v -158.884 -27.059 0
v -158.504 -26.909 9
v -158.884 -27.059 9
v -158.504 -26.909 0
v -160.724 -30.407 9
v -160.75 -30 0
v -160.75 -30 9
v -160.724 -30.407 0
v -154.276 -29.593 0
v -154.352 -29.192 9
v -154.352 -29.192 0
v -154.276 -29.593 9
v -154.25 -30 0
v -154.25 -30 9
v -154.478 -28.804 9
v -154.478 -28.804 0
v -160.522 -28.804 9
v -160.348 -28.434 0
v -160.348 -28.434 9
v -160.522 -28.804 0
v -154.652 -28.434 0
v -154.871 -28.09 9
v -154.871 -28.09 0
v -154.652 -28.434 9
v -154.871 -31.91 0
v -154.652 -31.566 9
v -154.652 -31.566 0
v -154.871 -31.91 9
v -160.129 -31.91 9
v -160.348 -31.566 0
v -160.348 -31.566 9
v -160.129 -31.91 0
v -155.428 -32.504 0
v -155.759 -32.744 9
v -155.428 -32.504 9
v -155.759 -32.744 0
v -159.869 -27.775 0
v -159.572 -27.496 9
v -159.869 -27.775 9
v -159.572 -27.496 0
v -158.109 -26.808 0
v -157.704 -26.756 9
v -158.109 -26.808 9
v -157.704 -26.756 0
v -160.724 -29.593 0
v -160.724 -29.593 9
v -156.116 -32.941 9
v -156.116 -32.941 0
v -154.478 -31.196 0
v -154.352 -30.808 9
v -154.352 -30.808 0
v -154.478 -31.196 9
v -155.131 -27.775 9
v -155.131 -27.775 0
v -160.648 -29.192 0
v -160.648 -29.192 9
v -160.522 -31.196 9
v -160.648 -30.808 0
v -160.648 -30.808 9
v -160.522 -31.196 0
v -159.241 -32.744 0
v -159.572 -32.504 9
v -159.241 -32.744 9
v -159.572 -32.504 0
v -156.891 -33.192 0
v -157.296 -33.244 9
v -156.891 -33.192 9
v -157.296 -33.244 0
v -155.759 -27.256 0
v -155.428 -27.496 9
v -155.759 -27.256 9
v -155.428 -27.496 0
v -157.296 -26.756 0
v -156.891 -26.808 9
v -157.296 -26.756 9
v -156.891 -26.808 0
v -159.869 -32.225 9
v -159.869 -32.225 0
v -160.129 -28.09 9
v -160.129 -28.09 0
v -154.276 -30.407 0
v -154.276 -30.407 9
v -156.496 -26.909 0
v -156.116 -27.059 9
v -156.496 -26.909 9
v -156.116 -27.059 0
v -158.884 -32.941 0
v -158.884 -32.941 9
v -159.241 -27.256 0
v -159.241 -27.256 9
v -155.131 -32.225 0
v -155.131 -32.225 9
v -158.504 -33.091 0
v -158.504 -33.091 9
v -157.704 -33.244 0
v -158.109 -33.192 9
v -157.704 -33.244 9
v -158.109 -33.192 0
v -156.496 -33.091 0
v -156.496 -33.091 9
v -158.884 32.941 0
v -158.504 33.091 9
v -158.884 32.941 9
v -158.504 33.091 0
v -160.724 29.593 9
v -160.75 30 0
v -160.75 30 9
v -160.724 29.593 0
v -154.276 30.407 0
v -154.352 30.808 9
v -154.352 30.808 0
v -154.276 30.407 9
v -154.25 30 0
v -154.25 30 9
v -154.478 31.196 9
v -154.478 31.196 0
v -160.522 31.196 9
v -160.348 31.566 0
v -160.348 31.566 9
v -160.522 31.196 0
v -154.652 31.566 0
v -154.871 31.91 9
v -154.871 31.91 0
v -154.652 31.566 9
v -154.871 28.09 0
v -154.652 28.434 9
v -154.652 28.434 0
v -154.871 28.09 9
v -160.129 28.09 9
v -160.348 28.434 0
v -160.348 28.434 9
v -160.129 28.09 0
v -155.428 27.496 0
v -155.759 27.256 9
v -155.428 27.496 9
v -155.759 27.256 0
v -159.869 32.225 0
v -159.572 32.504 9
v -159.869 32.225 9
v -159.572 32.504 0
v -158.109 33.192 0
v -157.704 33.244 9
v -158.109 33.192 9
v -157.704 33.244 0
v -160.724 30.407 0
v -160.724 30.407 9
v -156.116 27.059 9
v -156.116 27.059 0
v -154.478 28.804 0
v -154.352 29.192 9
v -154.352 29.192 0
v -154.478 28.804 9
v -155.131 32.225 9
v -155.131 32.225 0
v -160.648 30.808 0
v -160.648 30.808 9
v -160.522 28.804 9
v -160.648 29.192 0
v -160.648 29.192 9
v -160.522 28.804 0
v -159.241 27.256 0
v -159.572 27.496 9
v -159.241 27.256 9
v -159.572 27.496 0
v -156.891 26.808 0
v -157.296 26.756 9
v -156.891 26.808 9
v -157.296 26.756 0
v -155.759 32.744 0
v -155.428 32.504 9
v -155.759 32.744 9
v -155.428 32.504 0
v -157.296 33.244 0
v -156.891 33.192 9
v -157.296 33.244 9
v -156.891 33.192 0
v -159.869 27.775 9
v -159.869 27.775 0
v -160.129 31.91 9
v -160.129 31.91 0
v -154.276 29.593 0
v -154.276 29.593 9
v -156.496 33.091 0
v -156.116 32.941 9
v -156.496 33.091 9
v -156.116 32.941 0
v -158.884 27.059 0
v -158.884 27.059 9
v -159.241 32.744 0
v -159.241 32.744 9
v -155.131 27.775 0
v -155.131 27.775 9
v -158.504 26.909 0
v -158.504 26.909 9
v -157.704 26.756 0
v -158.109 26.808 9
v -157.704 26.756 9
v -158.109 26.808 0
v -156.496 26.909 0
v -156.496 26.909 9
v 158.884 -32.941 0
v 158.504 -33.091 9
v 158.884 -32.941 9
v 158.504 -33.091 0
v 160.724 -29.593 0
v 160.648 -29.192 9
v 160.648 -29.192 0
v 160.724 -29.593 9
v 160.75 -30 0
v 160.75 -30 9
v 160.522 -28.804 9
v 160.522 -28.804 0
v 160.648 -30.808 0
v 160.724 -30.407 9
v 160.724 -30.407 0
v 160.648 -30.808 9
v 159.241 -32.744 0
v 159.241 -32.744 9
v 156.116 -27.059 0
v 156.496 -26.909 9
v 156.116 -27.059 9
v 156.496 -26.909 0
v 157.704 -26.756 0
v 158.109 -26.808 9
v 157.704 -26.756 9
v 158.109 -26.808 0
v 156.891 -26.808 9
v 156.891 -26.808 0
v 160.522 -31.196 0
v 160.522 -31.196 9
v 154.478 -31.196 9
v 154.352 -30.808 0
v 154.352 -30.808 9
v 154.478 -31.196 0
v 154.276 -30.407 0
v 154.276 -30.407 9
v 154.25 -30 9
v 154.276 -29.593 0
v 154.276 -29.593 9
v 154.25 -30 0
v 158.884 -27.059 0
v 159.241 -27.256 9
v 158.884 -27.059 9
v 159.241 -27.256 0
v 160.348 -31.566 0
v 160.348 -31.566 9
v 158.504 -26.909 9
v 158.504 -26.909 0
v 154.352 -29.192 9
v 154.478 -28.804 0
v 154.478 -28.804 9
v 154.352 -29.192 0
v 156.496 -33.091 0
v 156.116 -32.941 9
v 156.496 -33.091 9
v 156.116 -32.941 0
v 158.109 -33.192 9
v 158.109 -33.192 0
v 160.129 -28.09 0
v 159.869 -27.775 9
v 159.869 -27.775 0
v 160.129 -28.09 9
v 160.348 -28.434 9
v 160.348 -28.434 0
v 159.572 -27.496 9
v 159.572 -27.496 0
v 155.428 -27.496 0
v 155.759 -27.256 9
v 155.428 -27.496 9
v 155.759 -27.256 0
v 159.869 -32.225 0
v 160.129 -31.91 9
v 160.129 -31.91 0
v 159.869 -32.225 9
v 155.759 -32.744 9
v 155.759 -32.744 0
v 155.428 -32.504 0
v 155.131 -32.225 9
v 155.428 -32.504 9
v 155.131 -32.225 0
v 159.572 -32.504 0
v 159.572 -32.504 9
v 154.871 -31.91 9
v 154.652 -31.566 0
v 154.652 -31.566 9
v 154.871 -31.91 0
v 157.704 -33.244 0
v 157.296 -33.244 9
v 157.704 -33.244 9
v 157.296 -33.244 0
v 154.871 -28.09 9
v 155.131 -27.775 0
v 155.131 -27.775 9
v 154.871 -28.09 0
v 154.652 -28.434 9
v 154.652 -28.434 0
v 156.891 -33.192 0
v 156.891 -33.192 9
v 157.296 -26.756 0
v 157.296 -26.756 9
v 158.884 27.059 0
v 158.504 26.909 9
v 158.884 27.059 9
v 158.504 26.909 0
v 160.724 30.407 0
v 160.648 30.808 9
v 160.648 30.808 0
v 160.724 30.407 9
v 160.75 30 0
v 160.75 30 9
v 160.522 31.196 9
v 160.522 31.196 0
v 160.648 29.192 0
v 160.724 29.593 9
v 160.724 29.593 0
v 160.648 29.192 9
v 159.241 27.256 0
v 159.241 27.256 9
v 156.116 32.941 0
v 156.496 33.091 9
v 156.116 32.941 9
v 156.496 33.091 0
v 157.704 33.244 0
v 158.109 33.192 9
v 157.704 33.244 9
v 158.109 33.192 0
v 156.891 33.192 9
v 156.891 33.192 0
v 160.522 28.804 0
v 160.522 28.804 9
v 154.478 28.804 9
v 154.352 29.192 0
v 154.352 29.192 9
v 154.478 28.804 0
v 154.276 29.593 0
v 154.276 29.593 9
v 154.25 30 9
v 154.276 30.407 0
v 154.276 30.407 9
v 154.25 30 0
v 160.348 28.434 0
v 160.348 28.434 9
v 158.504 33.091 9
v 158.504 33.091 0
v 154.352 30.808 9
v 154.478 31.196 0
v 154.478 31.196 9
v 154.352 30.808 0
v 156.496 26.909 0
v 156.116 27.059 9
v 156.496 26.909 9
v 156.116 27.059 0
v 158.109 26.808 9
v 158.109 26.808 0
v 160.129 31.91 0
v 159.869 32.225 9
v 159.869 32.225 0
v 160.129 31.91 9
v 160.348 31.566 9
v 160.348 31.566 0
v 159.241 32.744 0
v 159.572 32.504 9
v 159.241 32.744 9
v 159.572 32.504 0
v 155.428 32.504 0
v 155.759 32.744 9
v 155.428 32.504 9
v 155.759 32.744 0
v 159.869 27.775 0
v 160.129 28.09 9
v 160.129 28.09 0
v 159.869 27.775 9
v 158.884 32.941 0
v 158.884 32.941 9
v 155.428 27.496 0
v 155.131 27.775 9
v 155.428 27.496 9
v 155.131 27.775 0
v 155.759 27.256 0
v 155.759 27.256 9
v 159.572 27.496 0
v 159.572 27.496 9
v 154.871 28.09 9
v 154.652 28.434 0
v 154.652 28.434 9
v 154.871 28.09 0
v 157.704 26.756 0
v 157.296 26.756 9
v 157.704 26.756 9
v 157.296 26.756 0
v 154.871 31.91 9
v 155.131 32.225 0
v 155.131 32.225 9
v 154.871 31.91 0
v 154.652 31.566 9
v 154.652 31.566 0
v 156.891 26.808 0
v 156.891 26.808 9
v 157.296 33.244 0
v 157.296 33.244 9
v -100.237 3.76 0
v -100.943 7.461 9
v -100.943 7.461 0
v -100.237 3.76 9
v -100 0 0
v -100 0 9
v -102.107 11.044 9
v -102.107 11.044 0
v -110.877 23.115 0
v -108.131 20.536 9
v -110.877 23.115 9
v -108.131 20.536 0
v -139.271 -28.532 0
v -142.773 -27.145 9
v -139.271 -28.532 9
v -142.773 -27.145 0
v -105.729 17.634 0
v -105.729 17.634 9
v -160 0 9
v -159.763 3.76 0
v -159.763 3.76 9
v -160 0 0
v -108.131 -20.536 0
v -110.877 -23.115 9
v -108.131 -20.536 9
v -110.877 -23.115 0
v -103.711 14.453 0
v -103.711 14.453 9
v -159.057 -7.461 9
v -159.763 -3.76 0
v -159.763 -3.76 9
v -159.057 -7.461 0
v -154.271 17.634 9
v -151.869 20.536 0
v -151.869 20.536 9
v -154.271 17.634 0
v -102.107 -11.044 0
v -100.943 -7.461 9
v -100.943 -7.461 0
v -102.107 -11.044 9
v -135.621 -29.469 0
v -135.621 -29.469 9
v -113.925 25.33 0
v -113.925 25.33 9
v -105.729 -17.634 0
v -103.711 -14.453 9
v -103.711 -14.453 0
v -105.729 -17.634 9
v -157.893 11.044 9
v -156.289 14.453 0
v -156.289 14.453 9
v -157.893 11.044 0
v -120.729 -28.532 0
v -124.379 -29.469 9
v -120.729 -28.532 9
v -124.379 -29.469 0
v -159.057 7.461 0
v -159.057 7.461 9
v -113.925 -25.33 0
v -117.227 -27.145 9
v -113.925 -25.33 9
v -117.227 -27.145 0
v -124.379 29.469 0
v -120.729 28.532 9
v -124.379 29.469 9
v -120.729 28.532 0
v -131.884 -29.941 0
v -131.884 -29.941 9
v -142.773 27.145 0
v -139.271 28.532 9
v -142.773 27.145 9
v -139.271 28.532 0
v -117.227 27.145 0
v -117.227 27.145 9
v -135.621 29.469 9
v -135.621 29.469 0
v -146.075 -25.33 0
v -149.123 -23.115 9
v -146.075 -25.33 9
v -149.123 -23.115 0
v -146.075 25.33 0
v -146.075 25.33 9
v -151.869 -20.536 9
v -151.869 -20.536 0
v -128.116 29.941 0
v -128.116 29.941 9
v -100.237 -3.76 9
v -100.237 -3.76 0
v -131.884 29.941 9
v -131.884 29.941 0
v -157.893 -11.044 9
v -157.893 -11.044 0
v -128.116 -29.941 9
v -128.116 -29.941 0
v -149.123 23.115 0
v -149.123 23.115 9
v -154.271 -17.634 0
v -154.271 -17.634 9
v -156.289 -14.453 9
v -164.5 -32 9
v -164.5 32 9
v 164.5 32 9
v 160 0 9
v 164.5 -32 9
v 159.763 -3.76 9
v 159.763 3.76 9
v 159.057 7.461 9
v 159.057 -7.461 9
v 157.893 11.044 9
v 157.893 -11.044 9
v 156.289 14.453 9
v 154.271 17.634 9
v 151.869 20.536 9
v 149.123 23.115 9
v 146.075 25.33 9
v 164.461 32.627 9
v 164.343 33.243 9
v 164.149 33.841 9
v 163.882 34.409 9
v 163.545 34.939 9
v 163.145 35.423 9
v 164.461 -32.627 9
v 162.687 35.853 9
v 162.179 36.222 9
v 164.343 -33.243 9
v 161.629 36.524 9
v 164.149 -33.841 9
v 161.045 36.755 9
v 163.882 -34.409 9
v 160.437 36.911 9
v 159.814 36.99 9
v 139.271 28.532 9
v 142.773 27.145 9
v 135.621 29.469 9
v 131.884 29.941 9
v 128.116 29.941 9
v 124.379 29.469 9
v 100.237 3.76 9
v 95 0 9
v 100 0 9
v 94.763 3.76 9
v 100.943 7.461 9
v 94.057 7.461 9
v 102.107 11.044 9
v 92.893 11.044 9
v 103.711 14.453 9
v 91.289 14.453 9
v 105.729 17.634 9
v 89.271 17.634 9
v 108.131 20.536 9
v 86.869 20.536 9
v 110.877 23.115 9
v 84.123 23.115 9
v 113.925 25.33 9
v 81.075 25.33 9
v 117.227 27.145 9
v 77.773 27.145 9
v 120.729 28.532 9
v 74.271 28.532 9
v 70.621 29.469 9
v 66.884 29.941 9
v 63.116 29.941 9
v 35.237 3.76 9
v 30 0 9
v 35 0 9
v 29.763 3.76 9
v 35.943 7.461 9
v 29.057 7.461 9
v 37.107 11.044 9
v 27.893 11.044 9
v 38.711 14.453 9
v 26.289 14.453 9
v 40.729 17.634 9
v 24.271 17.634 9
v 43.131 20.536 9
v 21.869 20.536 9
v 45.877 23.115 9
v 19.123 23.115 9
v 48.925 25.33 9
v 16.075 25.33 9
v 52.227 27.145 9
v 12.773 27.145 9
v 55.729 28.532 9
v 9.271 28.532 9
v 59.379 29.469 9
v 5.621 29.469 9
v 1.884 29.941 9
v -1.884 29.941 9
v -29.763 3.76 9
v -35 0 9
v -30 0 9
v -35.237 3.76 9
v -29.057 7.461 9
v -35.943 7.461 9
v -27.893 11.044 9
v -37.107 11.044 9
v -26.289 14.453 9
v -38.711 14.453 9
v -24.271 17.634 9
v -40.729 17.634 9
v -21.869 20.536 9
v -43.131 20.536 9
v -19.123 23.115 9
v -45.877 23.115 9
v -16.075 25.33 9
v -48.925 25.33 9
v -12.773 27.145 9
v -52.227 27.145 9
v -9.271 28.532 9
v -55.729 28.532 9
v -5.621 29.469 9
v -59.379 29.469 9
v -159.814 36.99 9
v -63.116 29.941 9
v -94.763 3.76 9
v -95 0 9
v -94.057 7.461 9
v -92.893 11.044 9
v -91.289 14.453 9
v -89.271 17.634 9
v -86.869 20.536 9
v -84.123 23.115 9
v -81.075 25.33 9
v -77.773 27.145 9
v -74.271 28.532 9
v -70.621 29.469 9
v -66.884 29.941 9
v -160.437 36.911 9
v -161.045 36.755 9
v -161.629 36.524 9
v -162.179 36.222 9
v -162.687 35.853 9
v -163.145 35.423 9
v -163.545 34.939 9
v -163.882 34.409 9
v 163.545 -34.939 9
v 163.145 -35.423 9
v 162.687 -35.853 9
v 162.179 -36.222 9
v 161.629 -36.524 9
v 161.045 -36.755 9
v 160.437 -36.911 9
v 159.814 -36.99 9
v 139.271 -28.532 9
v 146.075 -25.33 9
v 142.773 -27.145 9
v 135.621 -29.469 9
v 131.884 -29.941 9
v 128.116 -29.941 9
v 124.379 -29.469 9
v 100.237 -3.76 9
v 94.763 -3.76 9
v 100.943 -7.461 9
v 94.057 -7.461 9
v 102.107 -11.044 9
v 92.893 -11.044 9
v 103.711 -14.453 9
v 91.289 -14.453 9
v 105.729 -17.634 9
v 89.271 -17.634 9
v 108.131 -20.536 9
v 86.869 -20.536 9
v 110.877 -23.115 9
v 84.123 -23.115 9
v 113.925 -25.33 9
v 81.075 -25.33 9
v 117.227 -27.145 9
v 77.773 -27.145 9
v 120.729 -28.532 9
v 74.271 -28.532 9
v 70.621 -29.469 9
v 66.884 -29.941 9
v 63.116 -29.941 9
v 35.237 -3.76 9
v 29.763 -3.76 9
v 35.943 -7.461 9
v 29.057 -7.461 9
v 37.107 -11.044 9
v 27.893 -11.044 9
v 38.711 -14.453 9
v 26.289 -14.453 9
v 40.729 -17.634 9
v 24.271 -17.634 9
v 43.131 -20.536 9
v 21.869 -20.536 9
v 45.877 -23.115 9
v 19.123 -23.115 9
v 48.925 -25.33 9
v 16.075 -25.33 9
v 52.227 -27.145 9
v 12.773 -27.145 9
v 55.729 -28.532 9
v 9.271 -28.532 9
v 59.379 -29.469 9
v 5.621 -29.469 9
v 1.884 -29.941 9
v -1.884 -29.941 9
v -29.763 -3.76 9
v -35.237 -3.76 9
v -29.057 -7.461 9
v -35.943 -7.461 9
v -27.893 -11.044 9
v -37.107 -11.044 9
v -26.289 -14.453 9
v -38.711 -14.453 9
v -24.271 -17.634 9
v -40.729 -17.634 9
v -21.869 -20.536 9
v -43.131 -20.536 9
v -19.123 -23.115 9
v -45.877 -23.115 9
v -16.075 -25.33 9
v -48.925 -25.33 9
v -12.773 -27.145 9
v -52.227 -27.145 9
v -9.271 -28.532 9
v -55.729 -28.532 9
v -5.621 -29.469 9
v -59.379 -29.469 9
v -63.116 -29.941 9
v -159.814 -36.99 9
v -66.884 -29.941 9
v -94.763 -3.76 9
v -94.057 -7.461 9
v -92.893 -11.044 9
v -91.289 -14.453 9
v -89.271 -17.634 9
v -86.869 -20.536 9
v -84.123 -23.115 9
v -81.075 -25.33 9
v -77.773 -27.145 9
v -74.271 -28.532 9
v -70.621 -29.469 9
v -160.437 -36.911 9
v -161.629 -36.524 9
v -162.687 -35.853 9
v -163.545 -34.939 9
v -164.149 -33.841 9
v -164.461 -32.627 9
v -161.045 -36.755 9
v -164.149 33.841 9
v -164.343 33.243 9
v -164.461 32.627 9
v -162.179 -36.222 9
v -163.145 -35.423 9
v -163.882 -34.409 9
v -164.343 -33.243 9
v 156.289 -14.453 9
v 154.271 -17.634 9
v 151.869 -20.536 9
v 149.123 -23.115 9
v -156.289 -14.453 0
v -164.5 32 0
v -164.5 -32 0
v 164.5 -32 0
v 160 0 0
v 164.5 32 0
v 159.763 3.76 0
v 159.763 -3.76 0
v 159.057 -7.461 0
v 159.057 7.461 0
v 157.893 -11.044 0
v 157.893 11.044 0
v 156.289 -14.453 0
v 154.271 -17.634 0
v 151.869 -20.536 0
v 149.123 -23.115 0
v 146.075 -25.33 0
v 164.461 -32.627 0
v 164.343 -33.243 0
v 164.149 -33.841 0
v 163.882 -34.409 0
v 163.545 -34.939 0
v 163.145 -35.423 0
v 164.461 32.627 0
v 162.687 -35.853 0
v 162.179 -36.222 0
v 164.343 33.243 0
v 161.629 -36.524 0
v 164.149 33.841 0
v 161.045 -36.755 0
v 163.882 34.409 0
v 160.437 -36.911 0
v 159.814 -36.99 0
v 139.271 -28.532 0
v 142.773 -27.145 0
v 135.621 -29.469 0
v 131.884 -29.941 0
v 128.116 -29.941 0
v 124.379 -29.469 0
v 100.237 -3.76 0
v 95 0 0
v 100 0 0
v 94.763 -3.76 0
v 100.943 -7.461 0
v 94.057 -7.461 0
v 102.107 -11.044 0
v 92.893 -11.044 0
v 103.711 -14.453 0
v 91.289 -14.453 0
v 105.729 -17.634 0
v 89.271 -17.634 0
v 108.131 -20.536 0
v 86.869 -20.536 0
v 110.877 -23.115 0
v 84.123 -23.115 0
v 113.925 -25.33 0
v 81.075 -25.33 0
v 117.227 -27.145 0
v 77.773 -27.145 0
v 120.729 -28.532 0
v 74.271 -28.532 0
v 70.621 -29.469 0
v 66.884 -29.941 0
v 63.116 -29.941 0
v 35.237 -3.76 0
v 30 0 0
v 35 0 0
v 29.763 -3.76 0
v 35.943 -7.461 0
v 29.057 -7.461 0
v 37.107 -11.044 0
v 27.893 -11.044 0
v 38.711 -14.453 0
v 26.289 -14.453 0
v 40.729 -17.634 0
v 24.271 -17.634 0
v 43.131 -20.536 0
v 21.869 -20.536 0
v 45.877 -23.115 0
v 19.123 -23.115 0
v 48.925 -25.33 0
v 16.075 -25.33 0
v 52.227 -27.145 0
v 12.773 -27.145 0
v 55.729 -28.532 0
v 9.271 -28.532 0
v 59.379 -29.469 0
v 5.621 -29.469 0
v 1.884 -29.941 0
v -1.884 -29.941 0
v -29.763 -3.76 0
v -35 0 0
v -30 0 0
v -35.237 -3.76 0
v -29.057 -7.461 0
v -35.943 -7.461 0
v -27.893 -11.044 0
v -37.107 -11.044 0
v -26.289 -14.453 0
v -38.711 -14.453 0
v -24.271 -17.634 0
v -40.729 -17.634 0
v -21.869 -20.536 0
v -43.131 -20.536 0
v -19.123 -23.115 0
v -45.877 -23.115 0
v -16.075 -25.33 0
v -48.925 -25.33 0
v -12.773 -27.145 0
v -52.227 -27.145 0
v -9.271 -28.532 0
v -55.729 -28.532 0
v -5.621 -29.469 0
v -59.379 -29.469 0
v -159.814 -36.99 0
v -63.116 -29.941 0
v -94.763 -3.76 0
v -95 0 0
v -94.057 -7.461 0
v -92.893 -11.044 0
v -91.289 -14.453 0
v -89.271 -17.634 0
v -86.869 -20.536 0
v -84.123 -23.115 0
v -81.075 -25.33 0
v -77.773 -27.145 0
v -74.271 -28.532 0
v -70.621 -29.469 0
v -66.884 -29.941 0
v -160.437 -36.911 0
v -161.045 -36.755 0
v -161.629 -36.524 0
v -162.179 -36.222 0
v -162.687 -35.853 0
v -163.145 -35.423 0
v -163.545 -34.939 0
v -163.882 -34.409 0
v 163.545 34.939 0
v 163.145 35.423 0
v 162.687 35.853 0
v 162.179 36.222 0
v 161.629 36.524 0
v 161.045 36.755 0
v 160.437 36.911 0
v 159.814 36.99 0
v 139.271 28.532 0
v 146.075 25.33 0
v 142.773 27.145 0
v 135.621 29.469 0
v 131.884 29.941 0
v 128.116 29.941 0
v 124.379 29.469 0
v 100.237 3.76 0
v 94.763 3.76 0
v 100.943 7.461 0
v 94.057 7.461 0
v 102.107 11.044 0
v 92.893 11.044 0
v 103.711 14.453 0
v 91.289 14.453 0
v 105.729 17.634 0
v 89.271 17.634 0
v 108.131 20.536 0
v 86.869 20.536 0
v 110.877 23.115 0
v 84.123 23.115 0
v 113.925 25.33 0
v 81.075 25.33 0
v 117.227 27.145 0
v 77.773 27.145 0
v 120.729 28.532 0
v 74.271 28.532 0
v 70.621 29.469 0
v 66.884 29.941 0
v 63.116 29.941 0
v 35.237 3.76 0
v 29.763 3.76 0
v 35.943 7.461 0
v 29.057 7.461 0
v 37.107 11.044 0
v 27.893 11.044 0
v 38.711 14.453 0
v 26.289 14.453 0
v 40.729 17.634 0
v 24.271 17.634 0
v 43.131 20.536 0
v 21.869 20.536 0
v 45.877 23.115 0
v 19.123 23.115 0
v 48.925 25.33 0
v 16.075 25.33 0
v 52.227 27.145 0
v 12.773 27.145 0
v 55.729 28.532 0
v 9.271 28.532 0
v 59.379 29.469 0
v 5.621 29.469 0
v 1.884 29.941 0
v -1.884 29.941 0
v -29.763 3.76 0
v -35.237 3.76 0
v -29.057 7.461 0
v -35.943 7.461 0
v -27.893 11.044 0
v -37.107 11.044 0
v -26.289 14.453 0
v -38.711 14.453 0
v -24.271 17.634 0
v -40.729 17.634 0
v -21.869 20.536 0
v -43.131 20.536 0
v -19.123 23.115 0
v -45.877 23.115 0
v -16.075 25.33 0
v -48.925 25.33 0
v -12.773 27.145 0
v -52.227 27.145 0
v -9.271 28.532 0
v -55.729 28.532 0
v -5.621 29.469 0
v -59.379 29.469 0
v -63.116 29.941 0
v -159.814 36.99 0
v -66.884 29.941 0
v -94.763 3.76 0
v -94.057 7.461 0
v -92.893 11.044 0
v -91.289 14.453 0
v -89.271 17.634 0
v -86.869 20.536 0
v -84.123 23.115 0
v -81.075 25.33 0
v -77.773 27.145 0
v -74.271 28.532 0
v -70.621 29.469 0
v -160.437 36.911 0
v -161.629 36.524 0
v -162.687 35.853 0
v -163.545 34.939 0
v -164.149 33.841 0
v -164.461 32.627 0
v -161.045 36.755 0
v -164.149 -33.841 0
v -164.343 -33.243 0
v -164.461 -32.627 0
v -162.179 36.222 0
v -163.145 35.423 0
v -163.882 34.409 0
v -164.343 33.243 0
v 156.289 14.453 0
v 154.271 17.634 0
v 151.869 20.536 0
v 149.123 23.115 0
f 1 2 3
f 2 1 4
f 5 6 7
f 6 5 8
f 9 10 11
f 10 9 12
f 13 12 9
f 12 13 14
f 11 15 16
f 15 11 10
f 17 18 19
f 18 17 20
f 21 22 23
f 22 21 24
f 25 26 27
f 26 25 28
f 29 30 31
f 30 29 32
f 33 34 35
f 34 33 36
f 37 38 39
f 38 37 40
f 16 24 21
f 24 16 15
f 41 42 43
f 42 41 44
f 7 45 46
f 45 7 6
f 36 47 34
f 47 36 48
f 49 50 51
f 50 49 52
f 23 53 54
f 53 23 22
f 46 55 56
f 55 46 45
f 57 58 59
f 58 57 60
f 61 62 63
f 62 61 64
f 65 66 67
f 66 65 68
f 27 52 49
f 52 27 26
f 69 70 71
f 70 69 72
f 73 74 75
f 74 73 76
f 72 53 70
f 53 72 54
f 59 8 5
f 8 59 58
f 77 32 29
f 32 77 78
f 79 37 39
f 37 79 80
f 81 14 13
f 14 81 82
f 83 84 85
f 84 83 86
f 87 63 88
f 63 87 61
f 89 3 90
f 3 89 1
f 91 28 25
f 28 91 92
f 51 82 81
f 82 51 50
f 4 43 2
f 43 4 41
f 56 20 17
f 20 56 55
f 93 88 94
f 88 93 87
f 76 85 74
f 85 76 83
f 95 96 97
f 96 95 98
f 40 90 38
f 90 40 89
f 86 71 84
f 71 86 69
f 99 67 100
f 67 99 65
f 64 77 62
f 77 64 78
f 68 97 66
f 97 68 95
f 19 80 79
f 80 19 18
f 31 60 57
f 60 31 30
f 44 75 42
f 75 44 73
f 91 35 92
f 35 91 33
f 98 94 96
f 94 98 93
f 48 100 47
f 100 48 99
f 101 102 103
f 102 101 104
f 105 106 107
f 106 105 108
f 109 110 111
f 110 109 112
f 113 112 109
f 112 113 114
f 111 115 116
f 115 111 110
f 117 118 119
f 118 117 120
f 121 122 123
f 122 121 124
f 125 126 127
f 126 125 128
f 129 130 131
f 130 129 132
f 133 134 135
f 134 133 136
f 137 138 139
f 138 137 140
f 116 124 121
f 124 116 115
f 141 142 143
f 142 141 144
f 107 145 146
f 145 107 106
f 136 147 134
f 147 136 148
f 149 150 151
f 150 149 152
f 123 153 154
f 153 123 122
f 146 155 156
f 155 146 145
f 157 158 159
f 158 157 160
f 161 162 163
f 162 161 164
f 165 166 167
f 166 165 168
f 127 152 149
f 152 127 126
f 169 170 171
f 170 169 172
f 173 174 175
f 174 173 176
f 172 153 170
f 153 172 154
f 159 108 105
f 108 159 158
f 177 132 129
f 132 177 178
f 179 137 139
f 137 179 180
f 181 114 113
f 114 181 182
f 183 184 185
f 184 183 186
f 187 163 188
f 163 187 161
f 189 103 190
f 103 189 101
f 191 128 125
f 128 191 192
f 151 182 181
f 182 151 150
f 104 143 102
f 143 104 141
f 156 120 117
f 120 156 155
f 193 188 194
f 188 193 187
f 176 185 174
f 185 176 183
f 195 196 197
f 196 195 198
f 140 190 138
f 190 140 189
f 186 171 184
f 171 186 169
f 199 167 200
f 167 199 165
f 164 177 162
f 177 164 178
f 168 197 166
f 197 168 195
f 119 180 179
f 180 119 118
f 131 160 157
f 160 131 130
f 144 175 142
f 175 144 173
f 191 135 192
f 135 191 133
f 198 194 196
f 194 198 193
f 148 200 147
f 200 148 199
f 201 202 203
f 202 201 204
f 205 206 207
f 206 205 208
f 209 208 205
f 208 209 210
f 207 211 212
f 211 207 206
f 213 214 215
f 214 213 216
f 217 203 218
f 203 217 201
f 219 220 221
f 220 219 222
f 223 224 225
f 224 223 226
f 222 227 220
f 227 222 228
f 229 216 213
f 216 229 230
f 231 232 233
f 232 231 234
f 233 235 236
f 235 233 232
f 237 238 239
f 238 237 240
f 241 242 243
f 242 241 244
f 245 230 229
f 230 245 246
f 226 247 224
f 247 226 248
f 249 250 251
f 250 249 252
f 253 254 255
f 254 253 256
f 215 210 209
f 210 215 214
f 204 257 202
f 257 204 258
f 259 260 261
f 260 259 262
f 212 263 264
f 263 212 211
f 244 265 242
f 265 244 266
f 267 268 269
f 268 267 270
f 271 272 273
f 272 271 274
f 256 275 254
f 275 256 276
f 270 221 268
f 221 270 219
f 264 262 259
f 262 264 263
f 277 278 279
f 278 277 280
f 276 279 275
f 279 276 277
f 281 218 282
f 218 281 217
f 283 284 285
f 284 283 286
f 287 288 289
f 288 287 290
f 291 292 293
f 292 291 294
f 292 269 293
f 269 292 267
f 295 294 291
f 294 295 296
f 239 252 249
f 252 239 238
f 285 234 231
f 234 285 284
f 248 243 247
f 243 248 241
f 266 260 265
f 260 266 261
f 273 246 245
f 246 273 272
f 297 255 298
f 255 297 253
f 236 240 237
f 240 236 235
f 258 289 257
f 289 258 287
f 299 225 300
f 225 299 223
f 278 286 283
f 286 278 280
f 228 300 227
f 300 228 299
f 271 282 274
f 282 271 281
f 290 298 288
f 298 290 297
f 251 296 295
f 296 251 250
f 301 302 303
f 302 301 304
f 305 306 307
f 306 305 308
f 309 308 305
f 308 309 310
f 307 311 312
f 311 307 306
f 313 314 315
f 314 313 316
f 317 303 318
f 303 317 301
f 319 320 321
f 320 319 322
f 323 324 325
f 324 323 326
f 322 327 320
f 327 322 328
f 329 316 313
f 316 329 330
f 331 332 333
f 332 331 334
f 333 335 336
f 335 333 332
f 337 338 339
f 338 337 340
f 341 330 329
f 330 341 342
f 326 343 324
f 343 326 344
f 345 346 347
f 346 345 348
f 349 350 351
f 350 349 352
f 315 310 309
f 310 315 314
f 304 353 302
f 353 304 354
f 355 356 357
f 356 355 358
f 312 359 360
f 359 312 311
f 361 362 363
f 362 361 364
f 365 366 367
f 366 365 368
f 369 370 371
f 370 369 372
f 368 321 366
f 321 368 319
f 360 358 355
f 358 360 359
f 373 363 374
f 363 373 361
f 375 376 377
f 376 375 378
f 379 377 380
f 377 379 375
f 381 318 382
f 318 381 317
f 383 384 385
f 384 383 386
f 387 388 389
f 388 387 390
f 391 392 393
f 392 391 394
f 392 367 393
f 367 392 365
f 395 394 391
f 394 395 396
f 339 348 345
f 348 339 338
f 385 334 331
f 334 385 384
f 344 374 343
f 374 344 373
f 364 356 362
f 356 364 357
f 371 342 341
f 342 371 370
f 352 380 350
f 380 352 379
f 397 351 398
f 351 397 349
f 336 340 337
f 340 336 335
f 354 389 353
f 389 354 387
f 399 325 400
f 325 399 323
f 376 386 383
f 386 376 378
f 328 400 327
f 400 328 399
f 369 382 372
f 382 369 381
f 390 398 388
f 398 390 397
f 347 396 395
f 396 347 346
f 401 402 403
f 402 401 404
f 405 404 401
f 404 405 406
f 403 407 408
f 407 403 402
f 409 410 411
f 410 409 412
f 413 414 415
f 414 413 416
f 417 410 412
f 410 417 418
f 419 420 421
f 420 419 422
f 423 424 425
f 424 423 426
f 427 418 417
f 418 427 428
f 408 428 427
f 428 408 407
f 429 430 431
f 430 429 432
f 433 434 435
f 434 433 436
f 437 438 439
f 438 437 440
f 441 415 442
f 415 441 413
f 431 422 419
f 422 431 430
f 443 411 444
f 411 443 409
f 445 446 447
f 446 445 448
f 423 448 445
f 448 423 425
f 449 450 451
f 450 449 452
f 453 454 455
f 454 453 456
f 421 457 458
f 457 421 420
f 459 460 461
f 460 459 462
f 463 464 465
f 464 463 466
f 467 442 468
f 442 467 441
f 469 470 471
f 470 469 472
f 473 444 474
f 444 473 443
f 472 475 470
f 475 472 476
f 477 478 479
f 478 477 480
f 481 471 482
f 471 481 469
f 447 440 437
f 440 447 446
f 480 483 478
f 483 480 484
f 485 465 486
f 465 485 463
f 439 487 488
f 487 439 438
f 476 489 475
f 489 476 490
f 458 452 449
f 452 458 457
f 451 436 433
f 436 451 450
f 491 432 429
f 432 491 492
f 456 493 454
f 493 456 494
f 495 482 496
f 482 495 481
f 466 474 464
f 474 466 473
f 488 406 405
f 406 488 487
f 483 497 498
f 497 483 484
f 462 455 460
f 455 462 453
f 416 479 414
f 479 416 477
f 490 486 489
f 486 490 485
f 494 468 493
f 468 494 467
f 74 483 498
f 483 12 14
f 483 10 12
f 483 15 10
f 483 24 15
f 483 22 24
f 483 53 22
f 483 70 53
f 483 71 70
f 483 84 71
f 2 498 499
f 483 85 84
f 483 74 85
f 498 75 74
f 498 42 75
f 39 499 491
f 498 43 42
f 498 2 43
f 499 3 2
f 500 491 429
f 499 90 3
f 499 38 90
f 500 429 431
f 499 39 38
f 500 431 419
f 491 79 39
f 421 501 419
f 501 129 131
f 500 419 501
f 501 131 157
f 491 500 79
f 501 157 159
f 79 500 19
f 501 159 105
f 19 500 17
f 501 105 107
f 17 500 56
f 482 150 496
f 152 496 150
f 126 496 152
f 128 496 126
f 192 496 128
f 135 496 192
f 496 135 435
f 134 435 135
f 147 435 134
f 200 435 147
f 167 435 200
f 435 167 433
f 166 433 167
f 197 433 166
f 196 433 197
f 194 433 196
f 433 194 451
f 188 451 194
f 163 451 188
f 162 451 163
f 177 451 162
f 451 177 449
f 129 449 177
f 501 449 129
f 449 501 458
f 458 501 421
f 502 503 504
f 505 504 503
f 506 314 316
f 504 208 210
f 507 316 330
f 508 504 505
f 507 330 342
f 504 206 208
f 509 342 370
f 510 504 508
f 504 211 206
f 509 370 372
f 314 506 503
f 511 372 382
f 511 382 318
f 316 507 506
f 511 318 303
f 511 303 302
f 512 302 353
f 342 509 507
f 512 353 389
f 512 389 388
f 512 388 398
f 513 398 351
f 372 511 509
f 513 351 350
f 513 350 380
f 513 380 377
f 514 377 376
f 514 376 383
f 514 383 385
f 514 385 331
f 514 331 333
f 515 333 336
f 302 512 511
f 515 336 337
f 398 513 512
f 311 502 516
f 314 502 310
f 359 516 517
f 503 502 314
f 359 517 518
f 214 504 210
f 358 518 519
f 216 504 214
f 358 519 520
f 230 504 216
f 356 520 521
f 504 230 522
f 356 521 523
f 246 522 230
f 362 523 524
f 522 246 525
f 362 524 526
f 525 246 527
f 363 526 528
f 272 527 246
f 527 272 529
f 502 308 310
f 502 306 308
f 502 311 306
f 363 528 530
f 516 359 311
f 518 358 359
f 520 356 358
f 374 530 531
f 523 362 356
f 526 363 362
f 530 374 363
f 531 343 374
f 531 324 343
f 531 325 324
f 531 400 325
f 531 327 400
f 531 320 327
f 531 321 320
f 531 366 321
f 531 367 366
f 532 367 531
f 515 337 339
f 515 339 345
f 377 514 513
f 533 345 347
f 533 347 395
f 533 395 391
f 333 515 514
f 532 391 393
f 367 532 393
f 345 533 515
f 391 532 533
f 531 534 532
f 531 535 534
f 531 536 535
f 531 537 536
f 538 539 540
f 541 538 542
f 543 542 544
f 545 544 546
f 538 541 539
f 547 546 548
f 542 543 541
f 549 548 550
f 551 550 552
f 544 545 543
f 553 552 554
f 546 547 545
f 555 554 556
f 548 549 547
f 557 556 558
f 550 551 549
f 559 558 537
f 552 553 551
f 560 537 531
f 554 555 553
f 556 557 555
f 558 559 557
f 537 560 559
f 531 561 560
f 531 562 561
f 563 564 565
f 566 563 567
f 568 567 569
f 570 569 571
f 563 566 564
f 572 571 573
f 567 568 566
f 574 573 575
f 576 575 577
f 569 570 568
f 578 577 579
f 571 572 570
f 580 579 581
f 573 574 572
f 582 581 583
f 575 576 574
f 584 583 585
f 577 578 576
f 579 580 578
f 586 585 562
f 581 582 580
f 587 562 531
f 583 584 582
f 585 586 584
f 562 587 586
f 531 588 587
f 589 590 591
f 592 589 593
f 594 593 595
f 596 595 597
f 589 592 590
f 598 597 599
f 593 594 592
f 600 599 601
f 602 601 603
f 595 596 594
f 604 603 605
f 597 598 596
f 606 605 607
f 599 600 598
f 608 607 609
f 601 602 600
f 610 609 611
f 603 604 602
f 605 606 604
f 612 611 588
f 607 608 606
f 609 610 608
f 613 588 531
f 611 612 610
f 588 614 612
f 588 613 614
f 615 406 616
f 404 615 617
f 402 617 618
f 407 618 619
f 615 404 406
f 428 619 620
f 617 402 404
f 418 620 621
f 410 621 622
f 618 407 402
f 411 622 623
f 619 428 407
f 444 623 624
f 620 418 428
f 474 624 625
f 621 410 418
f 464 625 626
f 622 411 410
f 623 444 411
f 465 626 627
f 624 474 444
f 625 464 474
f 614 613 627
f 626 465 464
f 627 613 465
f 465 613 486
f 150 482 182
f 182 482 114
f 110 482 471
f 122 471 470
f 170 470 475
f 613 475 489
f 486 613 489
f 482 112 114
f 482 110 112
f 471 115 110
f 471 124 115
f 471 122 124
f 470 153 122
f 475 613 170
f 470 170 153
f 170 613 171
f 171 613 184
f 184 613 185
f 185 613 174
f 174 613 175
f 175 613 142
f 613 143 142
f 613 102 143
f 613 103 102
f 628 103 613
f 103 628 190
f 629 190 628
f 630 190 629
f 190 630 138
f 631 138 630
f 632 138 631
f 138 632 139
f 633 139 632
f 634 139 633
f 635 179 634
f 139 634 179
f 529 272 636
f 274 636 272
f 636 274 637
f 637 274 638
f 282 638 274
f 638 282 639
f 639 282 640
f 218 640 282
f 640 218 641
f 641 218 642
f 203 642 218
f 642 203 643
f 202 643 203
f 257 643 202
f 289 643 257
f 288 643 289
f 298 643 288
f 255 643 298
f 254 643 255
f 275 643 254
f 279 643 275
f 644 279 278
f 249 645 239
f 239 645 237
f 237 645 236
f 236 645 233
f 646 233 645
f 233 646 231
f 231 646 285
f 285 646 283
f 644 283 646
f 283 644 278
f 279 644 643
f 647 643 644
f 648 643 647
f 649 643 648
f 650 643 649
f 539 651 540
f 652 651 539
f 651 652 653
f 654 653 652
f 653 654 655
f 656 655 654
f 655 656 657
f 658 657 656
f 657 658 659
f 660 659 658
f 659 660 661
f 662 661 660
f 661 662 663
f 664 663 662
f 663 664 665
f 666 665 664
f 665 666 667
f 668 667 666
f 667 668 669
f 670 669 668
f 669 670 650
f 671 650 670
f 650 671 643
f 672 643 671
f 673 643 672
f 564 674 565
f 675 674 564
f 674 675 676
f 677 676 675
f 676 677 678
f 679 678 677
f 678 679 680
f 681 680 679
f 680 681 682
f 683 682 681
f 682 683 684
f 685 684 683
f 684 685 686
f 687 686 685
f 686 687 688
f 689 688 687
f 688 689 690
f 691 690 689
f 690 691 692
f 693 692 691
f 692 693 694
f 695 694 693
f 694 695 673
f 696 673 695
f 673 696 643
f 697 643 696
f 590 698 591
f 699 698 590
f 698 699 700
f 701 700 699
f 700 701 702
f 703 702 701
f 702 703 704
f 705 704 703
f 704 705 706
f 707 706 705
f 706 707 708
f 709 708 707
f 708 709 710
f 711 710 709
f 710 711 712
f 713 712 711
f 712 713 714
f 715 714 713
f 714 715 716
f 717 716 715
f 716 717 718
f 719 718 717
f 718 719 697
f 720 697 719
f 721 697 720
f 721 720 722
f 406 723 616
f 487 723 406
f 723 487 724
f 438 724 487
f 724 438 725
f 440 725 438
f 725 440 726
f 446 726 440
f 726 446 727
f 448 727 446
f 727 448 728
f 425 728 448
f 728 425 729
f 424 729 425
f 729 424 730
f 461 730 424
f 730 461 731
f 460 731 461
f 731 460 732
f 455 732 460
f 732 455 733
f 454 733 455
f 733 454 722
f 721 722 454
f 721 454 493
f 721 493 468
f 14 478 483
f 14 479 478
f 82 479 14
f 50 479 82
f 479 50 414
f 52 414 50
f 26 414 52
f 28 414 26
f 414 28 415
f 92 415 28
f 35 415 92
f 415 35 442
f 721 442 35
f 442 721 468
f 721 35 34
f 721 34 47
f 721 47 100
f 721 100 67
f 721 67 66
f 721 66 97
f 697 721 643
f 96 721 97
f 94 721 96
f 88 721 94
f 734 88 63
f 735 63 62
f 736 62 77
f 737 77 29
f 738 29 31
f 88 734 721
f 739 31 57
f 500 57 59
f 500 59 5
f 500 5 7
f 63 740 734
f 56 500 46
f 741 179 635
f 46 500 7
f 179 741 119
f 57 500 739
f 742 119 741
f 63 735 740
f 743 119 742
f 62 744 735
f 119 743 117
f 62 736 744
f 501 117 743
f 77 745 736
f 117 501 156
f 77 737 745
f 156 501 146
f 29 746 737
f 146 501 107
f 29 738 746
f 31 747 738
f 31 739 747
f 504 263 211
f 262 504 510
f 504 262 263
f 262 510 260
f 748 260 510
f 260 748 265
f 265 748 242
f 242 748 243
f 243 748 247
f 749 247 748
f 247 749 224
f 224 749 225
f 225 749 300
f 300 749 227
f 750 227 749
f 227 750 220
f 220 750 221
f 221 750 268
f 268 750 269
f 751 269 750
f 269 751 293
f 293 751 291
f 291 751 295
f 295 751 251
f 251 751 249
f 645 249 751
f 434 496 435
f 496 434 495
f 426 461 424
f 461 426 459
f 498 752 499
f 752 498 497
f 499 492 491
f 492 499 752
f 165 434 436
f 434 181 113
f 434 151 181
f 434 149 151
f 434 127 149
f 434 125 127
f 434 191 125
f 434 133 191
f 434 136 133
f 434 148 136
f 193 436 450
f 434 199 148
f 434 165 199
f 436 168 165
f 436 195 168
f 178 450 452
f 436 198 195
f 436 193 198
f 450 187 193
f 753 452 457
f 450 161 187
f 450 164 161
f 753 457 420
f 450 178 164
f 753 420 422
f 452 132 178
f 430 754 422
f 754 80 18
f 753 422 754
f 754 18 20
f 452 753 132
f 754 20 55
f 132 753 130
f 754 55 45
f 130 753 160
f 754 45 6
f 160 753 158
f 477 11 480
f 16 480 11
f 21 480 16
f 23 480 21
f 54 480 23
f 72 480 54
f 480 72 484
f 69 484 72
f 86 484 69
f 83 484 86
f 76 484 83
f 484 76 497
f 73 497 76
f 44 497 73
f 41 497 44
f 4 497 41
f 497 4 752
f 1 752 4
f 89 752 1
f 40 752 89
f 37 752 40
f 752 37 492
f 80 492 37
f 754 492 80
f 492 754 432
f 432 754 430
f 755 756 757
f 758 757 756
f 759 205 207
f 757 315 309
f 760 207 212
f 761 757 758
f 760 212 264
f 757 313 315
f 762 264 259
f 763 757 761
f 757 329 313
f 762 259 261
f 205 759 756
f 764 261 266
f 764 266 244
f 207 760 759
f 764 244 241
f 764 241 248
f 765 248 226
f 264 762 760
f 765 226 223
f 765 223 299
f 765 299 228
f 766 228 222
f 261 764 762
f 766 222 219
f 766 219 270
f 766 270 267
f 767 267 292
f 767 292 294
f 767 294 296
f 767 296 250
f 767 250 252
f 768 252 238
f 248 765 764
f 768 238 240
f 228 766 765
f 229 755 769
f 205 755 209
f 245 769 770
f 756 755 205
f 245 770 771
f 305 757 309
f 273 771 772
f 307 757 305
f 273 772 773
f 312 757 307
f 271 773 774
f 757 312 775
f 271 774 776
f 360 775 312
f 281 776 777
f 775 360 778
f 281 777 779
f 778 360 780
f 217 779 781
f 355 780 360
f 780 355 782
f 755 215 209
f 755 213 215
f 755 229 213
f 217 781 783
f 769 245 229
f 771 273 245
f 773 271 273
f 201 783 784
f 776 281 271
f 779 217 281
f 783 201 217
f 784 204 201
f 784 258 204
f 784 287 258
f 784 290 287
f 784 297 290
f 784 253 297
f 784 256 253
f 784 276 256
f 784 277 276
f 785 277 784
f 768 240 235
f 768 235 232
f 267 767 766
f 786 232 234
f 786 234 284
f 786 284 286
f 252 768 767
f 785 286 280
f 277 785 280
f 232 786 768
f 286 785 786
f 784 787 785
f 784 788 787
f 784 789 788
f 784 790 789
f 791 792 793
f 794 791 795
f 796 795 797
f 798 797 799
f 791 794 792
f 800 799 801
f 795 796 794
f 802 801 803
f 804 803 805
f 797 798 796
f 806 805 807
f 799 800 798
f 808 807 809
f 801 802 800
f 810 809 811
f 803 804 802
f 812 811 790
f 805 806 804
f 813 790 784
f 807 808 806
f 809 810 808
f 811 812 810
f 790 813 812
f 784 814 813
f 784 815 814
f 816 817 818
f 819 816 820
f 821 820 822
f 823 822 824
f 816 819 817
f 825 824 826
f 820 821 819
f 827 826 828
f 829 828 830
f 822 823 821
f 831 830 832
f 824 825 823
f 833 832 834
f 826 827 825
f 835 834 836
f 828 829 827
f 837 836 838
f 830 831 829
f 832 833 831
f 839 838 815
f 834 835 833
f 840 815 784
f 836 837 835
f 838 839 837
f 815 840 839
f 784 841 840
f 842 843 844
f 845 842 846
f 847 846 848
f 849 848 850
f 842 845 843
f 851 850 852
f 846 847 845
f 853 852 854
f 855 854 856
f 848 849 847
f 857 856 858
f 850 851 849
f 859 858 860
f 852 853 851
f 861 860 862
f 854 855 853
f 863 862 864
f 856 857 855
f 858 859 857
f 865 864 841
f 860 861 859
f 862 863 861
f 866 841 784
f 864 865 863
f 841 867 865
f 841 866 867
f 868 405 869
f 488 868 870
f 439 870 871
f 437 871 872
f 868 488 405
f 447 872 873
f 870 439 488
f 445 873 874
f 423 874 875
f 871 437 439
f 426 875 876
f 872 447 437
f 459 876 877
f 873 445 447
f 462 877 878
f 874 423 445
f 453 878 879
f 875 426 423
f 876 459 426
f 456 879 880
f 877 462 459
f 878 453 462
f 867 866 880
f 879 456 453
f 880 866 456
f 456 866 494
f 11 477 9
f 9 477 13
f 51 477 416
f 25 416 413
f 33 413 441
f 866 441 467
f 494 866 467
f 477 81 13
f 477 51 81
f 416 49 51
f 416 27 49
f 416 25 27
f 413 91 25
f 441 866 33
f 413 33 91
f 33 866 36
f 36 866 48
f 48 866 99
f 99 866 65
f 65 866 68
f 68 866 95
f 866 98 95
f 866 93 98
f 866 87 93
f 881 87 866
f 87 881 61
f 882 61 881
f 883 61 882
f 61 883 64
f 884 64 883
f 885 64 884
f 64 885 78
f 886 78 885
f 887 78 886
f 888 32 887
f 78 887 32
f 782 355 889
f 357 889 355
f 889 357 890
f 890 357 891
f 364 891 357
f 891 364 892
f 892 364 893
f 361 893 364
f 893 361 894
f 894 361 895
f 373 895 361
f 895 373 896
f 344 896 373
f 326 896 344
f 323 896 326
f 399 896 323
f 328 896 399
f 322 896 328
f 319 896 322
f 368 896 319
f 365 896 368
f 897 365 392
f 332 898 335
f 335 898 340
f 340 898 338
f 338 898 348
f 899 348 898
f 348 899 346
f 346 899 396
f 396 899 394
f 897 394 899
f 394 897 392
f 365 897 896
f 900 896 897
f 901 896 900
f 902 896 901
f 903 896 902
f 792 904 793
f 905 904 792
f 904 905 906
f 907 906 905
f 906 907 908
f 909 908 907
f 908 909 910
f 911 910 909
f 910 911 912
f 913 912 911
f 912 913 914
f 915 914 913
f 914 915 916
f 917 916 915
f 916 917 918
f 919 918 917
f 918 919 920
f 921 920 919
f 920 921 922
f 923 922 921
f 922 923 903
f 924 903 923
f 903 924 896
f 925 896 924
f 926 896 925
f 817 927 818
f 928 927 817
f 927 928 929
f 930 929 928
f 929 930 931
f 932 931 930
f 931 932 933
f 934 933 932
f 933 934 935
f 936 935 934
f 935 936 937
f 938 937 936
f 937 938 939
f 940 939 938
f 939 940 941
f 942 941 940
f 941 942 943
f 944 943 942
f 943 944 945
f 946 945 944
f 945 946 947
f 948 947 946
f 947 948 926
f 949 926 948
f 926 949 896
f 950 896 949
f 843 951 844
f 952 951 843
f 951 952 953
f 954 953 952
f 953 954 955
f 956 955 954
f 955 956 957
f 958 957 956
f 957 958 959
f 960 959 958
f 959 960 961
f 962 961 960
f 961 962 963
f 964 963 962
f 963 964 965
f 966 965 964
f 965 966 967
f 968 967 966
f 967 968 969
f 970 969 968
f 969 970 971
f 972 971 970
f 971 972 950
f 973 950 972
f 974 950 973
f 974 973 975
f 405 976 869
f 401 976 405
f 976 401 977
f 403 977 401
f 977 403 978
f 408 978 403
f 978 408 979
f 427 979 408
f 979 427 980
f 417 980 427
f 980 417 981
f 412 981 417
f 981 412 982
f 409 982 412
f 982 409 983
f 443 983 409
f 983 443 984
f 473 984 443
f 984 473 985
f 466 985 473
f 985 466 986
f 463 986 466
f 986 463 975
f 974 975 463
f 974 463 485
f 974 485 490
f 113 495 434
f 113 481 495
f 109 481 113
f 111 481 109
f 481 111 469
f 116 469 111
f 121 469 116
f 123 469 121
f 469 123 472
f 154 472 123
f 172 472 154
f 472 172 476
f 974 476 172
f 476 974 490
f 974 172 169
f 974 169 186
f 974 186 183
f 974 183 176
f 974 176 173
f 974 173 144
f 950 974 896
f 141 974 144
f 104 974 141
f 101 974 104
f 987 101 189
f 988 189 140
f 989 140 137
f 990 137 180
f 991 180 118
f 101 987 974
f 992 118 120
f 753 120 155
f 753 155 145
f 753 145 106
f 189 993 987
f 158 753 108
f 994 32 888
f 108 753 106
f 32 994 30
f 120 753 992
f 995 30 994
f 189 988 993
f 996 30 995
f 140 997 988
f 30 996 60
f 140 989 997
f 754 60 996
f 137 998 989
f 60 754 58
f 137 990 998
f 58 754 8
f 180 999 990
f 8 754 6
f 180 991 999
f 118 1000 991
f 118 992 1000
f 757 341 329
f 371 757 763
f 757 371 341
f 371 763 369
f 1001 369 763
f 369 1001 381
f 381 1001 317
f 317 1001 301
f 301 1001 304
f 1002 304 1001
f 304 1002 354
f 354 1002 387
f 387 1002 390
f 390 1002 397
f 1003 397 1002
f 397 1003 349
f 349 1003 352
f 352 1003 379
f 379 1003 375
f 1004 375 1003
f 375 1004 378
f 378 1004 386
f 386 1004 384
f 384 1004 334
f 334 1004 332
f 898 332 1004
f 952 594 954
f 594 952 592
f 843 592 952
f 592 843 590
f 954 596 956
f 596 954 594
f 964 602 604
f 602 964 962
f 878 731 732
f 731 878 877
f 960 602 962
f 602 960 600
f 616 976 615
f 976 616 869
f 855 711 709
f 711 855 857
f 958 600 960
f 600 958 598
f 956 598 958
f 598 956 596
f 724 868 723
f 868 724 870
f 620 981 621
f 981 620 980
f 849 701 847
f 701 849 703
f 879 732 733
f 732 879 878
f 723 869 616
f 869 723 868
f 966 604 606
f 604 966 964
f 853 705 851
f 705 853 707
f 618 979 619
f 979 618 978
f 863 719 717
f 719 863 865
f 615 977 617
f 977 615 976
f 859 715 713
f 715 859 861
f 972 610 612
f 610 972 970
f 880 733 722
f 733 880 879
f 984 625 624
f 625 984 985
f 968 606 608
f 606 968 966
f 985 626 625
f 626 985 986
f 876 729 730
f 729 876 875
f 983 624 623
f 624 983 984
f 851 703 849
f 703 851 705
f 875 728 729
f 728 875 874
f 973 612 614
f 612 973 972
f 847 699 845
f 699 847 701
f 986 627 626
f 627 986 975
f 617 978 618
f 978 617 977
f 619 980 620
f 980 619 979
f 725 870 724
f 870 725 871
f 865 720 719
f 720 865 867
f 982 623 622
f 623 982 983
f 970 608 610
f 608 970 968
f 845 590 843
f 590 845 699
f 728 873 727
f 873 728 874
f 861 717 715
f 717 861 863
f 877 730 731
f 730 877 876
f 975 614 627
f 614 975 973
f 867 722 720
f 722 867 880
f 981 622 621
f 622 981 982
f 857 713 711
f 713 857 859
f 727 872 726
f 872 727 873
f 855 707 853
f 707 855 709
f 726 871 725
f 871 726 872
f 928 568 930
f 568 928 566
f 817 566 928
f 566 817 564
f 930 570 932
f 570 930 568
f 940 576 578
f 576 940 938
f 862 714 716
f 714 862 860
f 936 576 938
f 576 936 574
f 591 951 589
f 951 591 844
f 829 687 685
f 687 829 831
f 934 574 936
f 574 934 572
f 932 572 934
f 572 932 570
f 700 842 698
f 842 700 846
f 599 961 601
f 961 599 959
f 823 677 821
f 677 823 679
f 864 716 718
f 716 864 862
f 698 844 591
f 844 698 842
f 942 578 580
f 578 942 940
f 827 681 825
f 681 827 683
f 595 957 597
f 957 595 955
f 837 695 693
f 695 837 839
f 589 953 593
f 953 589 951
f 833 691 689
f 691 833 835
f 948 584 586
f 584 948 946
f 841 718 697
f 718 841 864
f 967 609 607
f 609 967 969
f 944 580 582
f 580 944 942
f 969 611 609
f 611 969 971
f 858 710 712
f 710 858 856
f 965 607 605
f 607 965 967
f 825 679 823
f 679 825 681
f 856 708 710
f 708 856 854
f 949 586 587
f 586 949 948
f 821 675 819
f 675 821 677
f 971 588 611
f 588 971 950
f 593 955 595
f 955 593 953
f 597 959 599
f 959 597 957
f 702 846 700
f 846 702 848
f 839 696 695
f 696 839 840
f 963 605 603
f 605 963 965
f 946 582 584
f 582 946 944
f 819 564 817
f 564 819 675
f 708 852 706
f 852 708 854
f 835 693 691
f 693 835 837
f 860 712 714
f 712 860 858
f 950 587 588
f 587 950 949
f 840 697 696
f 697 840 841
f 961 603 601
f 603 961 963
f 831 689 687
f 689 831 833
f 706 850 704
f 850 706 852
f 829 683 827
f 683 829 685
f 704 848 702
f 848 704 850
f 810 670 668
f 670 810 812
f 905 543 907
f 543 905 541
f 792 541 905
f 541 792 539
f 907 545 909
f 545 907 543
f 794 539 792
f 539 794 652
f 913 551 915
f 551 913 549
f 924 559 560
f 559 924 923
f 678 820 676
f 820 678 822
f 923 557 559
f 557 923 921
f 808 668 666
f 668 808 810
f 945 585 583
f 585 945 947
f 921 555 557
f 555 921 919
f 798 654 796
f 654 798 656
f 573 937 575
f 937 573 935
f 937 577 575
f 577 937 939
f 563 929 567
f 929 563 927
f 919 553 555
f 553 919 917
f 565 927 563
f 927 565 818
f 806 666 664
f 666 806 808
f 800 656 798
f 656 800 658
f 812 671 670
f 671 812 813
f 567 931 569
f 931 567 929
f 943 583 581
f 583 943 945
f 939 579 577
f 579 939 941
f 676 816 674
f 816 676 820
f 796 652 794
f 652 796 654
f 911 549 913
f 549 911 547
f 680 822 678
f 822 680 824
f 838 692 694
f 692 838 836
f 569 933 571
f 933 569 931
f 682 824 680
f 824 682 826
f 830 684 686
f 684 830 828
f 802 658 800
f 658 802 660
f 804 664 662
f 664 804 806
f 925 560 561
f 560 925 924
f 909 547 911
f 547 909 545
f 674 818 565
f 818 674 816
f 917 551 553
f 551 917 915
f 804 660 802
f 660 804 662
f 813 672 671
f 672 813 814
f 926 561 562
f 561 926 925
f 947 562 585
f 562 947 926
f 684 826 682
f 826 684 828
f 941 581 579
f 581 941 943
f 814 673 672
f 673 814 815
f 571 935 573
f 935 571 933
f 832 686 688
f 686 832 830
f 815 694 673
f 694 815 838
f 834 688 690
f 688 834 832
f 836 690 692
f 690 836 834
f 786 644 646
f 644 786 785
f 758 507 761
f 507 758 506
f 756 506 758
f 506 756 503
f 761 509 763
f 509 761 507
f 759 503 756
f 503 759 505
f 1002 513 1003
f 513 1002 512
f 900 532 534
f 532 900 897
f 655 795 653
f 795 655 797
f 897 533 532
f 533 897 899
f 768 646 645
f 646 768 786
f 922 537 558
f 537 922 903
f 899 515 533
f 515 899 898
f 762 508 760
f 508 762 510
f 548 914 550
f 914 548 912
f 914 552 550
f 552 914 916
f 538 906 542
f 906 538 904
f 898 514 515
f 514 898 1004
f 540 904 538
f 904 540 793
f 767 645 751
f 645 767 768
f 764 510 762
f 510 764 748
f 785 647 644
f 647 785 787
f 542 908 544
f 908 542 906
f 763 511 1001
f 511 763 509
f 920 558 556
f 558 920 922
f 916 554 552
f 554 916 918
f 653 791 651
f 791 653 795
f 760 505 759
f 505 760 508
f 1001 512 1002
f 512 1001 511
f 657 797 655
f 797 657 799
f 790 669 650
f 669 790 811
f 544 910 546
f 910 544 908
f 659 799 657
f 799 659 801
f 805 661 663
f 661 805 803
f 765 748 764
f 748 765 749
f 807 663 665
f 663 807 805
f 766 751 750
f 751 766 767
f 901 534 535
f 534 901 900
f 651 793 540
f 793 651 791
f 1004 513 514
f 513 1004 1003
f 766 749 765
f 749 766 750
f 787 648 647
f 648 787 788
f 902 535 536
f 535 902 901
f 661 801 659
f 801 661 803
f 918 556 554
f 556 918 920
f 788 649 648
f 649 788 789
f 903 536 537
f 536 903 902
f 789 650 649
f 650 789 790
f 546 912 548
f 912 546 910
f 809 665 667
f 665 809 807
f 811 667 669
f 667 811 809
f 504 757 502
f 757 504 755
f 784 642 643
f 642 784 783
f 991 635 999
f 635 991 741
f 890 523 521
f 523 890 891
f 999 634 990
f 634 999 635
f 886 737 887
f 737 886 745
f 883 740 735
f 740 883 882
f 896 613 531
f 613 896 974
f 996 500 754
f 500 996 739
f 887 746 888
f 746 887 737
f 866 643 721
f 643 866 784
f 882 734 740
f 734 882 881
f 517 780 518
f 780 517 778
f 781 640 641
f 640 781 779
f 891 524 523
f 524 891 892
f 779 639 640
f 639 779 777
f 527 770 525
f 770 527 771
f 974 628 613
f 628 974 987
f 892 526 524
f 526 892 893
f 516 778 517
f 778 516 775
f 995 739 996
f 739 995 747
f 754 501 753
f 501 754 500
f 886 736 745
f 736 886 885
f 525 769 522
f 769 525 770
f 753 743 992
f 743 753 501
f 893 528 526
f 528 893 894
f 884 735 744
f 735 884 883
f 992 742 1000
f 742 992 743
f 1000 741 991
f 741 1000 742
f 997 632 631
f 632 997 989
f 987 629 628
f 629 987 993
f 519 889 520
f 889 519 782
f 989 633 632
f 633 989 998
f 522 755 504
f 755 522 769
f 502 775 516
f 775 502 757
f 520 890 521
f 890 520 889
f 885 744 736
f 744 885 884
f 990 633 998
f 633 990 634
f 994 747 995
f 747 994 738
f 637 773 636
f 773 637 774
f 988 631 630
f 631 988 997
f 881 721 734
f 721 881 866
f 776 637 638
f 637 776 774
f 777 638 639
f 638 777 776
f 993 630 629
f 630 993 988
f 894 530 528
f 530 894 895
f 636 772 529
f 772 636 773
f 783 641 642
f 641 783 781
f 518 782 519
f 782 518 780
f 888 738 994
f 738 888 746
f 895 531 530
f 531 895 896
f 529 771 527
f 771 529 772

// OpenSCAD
$fn = 50;

difference() {
	union() {
		hull() {
			translate(v = [-159.5, 32.0, 0]) {
				cylinder(h = 9, r = 5);
			}
			translate(v = [159.5, 32.0, 0]) {
				cylinder(h = 9, r = 5);
			}
			translate(v = [-159.5, -32.0, 0]) {
				cylinder(h = 9, r = 5);
			}
			translate(v = [159.5, -32.0, 0]) {
				cylinder(h = 9, r = 5);
			}
		}
	}
	union() {
		translate(v = [-157.5, -30.0, -100.0]) {
			cylinder(h = 200, r = 3.25);
		}
		translate(v = [-157.5, 30.0, -100.0]) {
			cylinder(h = 200, r = 3.25);
		}
		translate(v = [157.5, -30.0, -100.0]) {
			cylinder(h = 200, r = 3.25);
		}
		translate(v = [157.5, 30.0, -100.0]) {
			cylinder(h = 200, r = 3.25);
		}
		translate(v = [-157.5, -30.0, -100.0]) {
			cylinder(h = 200, r = 1.8);
		}
		translate(v = [-157.5, 30.0, -100.0]) {
			cylinder(h = 200, r = 1.8);
		}
		translate(v = [157.5, -30.0, -100.0]) {
			cylinder(h = 200, r = 1.8);
		}
		translate(v = [157.5, 30.0, -100.0]) {
			cylinder(h = 200, r = 1.8);
		}
		translate(v = [-130.0, 0, 0.0]) {
			cylinder(h = 9, r = 30.0);
		}
		translate(v = [-65.0, 0, 0.0]) {
			cylinder(h = 9, r = 30.0);
		}
		cylinder(h = 9, r = 30.0);
		translate(v = [65.0, 0, 0.0]) {
			cylinder(h = 9, r = 30.0);
		}
		translate(v = [130.0, 0, 0.0]) {
			cylinder(h = 9, r = 30.0);
		}
	}
}
